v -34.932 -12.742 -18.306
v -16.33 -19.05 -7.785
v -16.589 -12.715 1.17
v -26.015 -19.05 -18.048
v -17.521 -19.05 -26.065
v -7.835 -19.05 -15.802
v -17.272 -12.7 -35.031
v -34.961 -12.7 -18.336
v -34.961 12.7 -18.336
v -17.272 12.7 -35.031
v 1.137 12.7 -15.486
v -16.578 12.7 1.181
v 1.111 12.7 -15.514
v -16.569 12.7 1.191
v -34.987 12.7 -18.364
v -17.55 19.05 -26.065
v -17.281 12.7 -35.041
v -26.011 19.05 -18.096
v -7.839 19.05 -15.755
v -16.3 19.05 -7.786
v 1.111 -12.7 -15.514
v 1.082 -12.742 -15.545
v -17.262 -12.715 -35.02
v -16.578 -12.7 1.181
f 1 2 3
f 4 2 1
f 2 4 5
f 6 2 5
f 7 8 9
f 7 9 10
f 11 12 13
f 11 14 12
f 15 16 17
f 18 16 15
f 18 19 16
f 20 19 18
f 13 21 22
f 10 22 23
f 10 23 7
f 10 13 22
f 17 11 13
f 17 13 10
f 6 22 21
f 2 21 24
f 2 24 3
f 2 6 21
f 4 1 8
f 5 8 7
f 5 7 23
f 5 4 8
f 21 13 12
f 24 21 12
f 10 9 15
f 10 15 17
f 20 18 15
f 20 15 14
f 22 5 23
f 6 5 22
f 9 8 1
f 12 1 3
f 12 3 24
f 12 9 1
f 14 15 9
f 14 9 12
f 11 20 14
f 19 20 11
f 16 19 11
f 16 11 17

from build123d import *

# Parameters (mm, degrees)
F0_R      = 23.1993727041
F1_DEPTH  = 12.7
F2_R      = 23.1993727041
F3_DEPTH  = 12.7
F6_DEPTH  = 6.35
F7_DEPTH  = 6.35
F8_SIZE   = 6.34999
F9_SIZE   = 6.34999
F10_DEPTH = 25.4
F11_DEPTH = 127


# Not quite as in the source:
# - a fillet or chamfer is up to 0.001 mm smaller than in the source, because OpenCascade refuses the exact size


with BuildPart() as f1:
    # F0 (on Front) → F1 (new body)
    with BuildSketch(Plane.XZ):
        with Locations((-16.9251933694, -16.9251933694)):
            Circle(F0_R)
    extrude(amount=F1_DEPTH)

    # F2 (on face) → F3 (join)
    with BuildSketch(Plane(origin=(0, 0, 0), x_dir=(-1, 0, 0), z_dir=(0, 1, 0))):
        with Locations((16.9251933694, -16.9251933694)):
            Circle(F2_R)
    extrude(amount=F3_DEPTH)

    # F4 (on face) → F6 (join)
    with BuildSketch(Plane(origin=(0, 12.7, 0), x_dir=(-1, 0, 0), z_dir=(0, 1, 0))):
        Polygon((34.987336153, -18.3641740003), (16.5690030176, 1.1906780042), (-1.1369494142, -15.4862127385), (17.2813837212, -35.041064743), align=None)
    extrude(amount=F6_DEPTH)

    # F5 (on face) → F7 (join)
    with BuildSketch(Plane.XZ.offset(12.7)):
        Polygon((1.1413726115, -15.5428544637), (-16.5892601531, 1.1910649658), (-34.9917593503, -18.3075322751), (-17.2611265857, -35.0414517045), align=None)
    extrude(amount=F7_DEPTH)

    # F8 (size 6.35 in the source; OpenCascade refuses exactly that, so slightly less here)
    f8_edges = [f1.edges().sort_by_distance(p)[0] for p in [
        (-8.072217, 19.05, -25.263639),
        (-26.13436, 19.05, -26.702619),
        (-25.77817, 19.05, -8.586748),
        (-7.716027, 19.05, -7.147767),
    ]]
    chamfer(f8_edges, length=F8_SIZE)

    # F9 (size 6.35 in the source; OpenCascade refuses exactly that, so slightly less here)
    f9_edges = [f1.edges().sort_by_distance(p)[0] for p in [
        (-8.059877, -19.05, -25.292153),
        (-7.723944, -19.05, -7.175895),
        (-25.79051, -19.05, -8.558234),
        (-26.126443, -19.05, -26.674492),
    ]]
    chamfer(f9_edges, length=F9_SIZE)

    # F10 (cut): faces of the model
    f10_faces = [f1.faces().sort_by_distance(p)[0] for p in [
        (-39.4683887232, -12.7, -16.9251933694),
        (-39.4683887232, -12.7, -16.9251933694),
        (-39.4683887232, -12.7, -16.9251933694),
        (-39.4683887232, -12.7, -16.9251933694),
    ]]
    extrude(f10_faces, amount=-F10_DEPTH, mode=Mode.SUBTRACT)

    # F11 (cut): faces of the model
    f11_faces = [f1.faces().sort_by_distance(p)[0] for p in [
        (-6.6175325, 12.7, -23.7415572289),
        (-27.2328542388, 12.7, -10.1088295099),
    ]]
    extrude(f11_faces, amount=-F11_DEPTH, mode=Mode.SUBTRACT)


solid = f1.part
